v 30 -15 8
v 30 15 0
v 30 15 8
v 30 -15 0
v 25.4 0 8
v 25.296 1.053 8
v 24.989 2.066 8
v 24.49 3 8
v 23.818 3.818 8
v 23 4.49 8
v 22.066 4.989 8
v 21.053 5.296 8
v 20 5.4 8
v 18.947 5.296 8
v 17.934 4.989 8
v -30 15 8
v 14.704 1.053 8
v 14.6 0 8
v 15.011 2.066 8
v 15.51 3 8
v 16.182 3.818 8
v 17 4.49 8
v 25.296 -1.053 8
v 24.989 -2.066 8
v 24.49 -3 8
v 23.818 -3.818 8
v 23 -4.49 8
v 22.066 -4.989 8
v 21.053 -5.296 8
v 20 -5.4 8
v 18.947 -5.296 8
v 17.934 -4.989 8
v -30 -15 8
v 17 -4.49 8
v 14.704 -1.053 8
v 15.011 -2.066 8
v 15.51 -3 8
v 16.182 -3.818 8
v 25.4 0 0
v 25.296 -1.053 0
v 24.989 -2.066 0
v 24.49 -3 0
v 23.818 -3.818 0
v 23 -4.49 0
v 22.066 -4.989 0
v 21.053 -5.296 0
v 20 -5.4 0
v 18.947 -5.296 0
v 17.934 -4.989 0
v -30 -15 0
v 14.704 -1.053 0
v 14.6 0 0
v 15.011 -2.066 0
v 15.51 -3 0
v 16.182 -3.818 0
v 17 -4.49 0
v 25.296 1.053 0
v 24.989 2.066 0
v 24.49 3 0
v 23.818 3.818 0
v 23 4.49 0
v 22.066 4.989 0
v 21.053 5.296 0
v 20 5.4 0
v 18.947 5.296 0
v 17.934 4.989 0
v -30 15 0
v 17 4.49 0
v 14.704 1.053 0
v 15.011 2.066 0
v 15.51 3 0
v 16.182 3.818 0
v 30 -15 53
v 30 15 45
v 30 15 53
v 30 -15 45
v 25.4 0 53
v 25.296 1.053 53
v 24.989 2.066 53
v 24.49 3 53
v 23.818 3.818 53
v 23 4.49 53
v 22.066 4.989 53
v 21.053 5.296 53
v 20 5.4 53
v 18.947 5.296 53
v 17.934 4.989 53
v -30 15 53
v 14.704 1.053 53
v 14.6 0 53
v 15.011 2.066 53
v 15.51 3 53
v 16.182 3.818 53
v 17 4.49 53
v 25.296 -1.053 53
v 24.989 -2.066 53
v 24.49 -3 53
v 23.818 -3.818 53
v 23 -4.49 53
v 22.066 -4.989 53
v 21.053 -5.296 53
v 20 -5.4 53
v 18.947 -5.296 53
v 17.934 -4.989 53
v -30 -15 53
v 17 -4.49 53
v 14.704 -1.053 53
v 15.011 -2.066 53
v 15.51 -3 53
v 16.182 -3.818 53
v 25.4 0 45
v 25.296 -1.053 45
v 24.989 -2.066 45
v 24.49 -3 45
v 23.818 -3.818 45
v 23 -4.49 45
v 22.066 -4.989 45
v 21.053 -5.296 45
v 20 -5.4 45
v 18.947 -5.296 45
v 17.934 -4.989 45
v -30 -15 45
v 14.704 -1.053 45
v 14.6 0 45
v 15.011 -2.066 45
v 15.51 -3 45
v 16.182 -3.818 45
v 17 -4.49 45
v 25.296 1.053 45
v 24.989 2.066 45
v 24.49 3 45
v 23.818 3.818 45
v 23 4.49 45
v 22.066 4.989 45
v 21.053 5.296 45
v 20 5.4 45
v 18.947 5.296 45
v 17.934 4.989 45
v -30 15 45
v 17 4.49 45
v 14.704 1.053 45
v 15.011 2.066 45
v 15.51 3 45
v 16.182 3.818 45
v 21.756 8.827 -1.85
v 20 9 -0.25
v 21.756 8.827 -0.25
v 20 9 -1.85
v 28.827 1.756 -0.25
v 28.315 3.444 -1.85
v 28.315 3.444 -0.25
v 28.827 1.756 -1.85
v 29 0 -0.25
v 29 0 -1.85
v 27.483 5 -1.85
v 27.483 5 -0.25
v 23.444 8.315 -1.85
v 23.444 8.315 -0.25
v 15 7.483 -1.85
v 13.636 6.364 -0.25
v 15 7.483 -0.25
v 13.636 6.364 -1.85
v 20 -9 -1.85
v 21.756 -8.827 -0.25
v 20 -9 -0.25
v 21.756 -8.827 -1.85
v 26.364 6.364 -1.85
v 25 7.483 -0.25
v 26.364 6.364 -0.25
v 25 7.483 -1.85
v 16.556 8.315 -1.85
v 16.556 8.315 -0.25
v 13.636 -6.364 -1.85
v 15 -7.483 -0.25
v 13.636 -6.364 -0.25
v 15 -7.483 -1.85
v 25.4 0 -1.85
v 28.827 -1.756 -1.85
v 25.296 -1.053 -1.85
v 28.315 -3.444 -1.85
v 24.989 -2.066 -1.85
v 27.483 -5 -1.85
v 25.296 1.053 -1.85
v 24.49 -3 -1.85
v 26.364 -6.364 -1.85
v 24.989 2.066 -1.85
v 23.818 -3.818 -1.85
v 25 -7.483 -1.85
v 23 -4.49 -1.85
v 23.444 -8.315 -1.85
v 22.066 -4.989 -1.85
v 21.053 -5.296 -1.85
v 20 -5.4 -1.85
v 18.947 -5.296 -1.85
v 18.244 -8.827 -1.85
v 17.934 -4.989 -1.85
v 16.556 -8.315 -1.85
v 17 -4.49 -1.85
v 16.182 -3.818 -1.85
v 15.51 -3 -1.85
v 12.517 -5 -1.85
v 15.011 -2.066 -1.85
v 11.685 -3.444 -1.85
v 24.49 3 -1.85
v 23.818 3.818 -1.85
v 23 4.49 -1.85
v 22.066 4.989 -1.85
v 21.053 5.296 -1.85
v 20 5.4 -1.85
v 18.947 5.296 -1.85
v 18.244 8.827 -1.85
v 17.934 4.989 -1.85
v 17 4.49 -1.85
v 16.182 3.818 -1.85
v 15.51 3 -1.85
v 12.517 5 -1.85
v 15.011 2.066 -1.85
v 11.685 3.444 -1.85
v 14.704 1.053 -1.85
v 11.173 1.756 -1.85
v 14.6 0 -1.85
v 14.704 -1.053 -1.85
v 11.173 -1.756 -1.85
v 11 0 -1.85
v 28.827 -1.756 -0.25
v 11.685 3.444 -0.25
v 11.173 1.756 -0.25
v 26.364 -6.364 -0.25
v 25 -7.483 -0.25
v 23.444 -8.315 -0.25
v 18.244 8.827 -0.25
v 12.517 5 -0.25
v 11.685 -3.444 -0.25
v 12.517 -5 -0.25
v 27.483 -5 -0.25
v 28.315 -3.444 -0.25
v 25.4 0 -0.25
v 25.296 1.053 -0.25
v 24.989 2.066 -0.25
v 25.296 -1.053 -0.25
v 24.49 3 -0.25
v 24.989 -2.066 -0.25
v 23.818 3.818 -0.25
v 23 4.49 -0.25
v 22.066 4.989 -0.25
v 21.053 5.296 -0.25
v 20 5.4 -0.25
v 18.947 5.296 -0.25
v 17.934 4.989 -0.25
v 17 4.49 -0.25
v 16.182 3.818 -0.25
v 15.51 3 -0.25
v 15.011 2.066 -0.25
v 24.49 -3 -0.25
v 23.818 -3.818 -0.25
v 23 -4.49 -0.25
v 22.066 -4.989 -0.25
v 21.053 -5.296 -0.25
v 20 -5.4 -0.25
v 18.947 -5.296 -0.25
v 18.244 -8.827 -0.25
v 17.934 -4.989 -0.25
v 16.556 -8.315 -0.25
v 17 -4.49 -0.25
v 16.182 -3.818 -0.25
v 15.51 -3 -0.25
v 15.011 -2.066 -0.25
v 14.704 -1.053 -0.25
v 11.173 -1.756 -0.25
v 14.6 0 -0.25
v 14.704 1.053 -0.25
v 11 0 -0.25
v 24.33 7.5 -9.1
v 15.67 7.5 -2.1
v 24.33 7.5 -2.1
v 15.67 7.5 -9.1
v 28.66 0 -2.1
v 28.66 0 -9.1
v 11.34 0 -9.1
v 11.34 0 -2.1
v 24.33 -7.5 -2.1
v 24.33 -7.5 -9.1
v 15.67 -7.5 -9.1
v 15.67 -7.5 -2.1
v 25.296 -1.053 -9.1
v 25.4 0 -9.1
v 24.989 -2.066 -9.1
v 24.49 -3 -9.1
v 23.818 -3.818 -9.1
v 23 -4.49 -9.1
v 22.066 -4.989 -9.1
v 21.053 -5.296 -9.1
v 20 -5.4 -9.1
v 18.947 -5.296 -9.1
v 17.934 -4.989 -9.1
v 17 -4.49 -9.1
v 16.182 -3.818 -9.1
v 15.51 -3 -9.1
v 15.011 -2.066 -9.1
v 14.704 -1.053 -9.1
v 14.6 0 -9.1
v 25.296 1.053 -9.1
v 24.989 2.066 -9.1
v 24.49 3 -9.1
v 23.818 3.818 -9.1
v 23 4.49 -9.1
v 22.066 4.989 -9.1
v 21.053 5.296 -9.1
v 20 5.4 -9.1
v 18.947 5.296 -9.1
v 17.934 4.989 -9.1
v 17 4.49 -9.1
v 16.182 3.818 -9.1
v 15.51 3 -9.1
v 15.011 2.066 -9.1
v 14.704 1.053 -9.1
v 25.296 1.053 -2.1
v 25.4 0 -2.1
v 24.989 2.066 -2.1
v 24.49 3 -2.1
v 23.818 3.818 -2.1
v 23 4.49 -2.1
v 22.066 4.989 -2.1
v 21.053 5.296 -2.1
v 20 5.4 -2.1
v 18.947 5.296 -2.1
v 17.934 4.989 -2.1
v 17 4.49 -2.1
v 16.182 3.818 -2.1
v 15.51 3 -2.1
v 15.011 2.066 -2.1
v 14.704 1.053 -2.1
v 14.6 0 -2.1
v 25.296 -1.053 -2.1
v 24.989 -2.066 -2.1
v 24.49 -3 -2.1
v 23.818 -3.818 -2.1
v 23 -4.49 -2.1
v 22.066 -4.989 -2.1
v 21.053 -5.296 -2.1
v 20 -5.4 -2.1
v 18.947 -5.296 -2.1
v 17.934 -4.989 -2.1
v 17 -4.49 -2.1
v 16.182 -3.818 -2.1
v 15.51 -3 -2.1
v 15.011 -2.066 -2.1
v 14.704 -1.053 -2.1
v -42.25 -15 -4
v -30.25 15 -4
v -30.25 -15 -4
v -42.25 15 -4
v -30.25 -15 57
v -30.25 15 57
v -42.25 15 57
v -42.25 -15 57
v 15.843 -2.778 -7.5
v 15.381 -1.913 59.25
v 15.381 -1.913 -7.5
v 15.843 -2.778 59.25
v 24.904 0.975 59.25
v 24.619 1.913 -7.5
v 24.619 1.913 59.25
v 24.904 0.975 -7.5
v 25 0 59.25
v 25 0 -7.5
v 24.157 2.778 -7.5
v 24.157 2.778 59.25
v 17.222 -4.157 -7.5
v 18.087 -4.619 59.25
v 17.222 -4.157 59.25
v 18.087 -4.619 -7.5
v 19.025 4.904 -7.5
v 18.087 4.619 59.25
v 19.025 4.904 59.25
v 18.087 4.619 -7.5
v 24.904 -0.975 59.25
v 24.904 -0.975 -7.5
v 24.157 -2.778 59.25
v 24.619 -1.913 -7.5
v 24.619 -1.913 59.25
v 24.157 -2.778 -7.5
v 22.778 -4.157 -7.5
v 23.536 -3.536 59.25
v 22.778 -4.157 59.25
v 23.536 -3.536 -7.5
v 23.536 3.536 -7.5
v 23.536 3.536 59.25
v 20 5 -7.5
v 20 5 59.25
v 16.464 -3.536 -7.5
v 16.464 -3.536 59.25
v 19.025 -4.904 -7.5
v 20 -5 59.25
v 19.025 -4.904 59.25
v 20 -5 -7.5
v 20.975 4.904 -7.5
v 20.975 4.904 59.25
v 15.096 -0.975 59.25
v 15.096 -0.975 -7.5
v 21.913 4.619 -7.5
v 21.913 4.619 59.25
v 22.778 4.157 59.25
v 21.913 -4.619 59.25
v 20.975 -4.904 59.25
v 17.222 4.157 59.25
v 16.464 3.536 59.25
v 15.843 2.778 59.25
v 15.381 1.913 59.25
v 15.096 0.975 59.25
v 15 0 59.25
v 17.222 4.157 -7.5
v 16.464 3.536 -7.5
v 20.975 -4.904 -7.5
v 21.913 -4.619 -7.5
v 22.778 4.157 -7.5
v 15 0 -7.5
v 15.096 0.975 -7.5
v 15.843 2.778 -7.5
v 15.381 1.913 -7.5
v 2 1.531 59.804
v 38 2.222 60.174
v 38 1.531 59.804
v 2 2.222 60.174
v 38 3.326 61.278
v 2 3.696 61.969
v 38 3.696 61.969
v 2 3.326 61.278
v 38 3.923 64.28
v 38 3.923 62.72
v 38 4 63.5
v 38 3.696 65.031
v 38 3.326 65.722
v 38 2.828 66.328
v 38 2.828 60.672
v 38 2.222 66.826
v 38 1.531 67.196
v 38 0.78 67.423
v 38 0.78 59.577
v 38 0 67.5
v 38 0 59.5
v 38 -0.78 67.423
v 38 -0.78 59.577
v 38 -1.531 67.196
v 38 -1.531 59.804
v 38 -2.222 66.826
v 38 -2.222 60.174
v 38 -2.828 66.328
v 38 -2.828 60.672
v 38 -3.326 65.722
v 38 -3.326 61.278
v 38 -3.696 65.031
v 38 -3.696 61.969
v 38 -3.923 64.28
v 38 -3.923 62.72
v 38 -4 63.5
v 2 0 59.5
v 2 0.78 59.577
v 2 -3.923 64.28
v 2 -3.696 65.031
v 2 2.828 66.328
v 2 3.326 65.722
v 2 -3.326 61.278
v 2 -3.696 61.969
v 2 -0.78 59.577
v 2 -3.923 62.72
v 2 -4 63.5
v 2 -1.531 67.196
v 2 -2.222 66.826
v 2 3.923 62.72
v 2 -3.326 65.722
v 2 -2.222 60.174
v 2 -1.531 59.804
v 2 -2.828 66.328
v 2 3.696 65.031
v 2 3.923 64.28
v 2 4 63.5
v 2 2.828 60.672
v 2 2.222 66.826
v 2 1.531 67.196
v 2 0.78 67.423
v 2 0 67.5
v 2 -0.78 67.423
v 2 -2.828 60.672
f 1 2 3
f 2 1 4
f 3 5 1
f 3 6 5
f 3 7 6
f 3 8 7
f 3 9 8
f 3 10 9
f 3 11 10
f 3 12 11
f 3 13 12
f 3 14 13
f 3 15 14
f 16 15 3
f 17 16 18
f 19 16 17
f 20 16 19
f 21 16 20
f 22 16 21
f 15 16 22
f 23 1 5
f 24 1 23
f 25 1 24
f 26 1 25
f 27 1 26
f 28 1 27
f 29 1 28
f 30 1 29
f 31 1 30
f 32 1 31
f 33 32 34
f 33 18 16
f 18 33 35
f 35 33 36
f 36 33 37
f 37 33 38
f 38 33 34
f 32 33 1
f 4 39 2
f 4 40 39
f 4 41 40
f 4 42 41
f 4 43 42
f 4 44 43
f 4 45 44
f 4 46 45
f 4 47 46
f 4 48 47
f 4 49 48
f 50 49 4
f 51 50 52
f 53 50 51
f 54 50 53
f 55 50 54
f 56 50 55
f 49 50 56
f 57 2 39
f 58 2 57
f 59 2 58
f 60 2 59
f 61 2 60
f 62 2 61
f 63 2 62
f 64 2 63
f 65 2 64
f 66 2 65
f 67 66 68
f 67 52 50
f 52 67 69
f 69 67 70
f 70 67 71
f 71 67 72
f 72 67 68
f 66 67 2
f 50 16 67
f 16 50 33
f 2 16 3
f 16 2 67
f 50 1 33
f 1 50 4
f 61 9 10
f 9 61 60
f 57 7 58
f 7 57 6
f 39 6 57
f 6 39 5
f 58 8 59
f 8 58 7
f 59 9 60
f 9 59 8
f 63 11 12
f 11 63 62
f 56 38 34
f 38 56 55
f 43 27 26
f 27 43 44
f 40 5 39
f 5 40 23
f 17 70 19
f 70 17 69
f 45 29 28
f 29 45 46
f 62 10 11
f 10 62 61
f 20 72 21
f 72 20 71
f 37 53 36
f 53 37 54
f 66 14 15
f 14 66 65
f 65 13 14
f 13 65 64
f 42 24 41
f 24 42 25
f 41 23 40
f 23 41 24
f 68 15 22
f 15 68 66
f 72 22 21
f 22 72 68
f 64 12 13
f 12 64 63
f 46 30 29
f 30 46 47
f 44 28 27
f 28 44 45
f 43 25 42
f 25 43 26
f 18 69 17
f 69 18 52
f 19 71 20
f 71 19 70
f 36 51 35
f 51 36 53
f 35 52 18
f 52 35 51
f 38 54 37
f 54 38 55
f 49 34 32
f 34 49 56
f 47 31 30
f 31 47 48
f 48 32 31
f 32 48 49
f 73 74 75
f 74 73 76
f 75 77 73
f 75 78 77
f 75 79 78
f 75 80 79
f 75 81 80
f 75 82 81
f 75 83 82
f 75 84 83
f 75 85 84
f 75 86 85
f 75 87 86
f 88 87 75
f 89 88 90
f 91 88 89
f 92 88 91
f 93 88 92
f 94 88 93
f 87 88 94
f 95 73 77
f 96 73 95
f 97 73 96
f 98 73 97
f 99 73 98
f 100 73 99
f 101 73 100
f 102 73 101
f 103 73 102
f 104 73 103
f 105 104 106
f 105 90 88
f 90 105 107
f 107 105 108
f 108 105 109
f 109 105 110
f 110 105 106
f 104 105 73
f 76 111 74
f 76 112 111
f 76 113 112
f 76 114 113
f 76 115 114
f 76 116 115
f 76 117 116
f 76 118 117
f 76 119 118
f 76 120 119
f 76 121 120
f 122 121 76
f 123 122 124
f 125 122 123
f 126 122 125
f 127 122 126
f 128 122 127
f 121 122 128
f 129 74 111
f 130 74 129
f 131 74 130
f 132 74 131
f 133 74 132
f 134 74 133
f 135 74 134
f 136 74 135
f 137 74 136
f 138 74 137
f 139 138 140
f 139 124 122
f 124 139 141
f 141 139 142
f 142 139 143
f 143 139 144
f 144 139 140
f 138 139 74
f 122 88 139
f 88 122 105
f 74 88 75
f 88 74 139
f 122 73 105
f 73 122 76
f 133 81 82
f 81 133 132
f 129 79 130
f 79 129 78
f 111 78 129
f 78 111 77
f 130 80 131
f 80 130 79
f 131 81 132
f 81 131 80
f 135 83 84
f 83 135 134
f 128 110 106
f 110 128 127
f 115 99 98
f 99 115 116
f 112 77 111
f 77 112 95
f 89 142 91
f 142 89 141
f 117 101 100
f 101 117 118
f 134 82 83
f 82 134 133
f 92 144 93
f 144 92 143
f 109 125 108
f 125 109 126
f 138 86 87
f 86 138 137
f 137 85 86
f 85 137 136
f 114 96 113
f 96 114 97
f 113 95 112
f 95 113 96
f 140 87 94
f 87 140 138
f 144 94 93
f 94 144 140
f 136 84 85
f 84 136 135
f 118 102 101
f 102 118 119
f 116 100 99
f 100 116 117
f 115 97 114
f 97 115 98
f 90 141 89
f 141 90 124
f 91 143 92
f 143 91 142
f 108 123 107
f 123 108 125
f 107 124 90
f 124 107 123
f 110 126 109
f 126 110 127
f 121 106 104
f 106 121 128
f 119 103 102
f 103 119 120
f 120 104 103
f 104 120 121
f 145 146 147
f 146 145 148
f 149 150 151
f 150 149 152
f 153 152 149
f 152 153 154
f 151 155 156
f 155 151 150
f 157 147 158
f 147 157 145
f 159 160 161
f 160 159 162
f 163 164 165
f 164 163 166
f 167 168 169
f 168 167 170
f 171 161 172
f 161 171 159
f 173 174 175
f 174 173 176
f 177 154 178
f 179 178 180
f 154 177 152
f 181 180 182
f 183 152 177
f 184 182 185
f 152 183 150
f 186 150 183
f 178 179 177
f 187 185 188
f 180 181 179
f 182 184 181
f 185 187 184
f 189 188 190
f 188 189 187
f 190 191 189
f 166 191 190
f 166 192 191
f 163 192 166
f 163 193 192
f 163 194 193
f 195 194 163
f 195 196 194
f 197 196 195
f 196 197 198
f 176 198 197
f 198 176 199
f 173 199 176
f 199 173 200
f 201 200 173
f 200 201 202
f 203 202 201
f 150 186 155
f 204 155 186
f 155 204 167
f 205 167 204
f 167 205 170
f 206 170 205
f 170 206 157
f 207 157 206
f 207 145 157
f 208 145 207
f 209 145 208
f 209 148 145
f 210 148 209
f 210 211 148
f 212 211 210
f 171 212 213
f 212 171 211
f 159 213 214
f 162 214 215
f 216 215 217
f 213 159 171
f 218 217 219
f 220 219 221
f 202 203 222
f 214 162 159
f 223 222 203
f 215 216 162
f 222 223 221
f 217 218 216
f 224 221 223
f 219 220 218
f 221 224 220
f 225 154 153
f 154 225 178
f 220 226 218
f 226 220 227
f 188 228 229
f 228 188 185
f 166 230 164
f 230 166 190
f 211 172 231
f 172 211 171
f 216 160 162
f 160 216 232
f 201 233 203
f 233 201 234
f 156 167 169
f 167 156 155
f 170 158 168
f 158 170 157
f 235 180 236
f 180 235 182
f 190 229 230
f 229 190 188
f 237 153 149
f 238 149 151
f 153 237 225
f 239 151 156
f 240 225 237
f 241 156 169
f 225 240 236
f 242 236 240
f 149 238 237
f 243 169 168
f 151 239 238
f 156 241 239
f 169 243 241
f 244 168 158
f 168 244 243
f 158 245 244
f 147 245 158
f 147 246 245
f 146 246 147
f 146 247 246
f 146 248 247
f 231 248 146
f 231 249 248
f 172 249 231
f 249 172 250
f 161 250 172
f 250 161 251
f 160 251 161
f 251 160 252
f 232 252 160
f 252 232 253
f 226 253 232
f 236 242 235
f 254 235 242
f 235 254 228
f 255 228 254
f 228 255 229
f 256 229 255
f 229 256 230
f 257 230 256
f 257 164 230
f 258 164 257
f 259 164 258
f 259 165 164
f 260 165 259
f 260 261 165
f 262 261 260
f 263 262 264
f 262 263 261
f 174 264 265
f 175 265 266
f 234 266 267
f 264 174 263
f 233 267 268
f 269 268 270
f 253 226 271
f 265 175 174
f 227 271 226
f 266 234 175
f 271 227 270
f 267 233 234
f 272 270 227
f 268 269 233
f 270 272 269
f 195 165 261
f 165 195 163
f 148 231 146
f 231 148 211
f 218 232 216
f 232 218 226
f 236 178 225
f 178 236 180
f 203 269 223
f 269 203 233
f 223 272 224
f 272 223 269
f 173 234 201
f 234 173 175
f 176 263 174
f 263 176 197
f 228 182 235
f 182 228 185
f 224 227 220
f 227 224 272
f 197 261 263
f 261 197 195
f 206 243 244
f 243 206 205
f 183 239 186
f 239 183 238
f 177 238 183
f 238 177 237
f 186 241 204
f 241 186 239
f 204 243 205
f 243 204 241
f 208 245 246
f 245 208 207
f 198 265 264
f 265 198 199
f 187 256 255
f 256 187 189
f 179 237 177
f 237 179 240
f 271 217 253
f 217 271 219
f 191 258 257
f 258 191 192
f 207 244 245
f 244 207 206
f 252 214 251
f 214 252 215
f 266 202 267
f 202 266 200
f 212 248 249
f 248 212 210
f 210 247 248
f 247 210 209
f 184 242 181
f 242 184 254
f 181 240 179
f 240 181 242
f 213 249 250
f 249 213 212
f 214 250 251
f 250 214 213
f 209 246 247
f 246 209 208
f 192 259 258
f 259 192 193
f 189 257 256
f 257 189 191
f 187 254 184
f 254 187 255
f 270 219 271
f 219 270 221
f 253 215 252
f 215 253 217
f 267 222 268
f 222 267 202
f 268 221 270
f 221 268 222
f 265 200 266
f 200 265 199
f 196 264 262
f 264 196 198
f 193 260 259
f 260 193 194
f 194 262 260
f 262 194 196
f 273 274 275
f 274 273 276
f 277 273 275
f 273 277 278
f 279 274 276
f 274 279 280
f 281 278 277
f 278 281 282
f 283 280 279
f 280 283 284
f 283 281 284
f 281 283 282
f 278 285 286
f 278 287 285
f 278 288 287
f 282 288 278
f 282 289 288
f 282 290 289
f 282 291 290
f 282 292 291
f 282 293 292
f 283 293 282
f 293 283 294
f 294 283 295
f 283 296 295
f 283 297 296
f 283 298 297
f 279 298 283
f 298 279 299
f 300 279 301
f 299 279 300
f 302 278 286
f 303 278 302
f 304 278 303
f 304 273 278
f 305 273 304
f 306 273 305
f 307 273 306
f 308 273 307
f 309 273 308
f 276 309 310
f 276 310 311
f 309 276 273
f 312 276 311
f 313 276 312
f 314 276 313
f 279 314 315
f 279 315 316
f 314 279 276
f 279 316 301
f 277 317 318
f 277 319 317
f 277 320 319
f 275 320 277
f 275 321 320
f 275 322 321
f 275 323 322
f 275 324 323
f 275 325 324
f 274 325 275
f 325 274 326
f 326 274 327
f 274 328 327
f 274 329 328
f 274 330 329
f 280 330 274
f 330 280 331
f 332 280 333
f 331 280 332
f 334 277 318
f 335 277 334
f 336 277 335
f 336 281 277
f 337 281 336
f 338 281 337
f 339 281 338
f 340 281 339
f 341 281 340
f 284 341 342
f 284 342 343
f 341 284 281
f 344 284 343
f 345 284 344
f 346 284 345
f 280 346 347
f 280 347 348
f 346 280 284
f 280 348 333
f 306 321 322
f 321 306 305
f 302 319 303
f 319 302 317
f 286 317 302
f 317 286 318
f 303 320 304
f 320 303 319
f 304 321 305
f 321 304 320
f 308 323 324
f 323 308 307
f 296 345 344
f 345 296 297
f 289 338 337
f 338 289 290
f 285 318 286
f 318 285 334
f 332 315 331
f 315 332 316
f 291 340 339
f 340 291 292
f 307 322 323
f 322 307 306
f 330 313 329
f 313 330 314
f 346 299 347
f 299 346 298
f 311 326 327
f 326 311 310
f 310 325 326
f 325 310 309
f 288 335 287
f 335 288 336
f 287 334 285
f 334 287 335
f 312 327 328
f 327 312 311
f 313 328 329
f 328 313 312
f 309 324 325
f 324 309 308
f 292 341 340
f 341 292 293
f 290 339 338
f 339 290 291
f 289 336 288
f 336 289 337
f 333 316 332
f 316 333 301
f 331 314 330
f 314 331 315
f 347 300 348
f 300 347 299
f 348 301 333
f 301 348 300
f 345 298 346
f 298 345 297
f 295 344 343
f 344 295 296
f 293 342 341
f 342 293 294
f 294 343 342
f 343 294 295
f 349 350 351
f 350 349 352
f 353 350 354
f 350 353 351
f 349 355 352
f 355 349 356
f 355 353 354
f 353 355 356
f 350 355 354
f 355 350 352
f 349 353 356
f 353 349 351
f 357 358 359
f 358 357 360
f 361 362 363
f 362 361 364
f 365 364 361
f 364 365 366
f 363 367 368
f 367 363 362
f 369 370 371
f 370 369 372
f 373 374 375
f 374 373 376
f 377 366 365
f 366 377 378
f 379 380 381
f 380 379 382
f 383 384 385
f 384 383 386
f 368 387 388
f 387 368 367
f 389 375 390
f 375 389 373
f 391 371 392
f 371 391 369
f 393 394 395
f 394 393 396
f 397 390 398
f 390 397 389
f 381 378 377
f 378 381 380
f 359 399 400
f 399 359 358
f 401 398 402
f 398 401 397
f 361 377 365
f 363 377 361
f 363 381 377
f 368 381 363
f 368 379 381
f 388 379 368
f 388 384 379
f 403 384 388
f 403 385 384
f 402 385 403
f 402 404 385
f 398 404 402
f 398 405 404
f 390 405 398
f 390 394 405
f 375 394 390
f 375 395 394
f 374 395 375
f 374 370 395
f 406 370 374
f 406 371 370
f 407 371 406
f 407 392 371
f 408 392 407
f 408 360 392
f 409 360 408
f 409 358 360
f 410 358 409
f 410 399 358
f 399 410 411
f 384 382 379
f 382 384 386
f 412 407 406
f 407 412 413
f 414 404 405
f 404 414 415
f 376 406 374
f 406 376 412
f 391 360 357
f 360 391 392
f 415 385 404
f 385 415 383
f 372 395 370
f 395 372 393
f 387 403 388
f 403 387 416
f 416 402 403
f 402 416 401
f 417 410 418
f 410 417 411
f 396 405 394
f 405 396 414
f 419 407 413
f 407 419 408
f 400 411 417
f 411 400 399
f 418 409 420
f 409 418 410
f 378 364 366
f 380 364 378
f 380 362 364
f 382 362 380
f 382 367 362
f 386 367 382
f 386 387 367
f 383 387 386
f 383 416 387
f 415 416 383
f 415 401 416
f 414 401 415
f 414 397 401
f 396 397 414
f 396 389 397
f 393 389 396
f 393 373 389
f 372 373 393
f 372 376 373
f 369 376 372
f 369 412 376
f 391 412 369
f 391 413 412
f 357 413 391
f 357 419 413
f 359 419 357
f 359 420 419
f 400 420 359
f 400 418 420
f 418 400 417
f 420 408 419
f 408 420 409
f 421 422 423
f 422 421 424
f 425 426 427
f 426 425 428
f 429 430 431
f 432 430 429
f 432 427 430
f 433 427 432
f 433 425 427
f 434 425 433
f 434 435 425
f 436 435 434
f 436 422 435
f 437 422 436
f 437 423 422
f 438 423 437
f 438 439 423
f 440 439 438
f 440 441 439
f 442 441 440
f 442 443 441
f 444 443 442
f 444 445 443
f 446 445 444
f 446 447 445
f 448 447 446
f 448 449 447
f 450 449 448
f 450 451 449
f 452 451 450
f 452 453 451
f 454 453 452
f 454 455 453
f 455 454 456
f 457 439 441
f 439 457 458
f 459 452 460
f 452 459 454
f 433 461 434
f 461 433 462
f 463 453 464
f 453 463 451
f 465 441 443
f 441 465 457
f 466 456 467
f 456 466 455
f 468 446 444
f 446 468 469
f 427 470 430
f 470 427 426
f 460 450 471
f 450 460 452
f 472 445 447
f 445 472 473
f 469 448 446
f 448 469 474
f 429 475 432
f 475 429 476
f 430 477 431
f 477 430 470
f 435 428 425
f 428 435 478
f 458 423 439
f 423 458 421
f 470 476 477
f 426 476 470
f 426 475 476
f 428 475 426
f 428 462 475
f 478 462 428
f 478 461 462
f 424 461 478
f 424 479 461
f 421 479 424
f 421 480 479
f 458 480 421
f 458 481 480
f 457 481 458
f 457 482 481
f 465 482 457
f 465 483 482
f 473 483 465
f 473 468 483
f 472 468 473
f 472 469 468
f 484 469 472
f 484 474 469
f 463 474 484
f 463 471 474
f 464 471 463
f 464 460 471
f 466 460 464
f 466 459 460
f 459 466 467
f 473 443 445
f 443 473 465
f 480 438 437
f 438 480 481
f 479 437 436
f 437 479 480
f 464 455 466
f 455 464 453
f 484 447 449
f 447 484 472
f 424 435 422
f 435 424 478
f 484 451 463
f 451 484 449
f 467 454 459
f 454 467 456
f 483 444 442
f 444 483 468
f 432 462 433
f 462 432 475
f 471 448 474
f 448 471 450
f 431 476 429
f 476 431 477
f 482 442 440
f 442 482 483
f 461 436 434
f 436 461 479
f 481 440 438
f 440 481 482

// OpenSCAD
$fn = 32;

// ------------------------------------------------------------------------
// C clamp: throat 45 mm, screw d10
// Every part is its own module, assembly() places every instance.
// ------------------------------------------------------------------------

// --- part 1 ---
module clamp_arm() {
  difference() {
    translate([-30, -15, 0]) cube([60, 30, 8]);
    translate([20, 0, -1]) cylinder(h = 10, d = 10.8);
  }
}

// --- part 2 ---
module clamp_spine() {
  difference() {
    translate([-30.5, -15, 0]) cube([61, 30, 12]);
  }
}

// --- part 3 ---
module clamp_screw() {
  translate([0, 0, -33.375]) cylinder(h = 66.75, d = 10);
}

// --- part 4 ---
module clamp_washer() {
  difference() {
      translate([0, 0, 0]) cylinder(h = 1.6, d = 18);
      translate([0, 0, -1]) cylinder(h = 3.6, d = 10.8);
    }
}

// --- part 5 ---
module clamp_nut() {
  difference() {
    linear_extrude(height = 7) polygon(points = [[8.66, 0], [4.33, 7.5], [-4.33, 7.5], [-8.66, 0], [-4.33, -7.5], [4.33, -7.5]]);
    translate([0, 0, -1]) cylinder(h = 9, d = 10.8);
  }
}

// --- part 6 ---
module tommy_bar() {
  translate([0, 0, -18]) cylinder(h = 36, d = 8);
}

// --- assembly ---
module assembly() {
  color([0.80, 0.24, 0.20]) translate([0, 0, 0]) rotate([0, 0, 0]) clamp_arm();
  color([0.20, 0.45, 0.75]) translate([0, 0, 45]) rotate([0, 0, 0]) clamp_arm();
  color([0.25, 0.62, 0.32]) translate([-42.25, 0, 26.5]) rotate([0, 90, 0]) clamp_spine();
  color([0.92, 0.70, 0.18]) translate([20, 0, 25.875]) rotate([0, 0, 0]) clamp_screw();
  color([0.58, 0.35, 0.70]) translate([20, 0, -1.85]) rotate([0, 0, 0]) clamp_washer();
  color([0.16, 0.66, 0.66]) translate([20, 0, -9.1]) rotate([0, 0, 0]) clamp_nut();
  color([0.85, 0.48, 0.18]) translate([20, 0, 63.5]) rotate([0, 90, 0]) tommy_bar();
}

assembly();
